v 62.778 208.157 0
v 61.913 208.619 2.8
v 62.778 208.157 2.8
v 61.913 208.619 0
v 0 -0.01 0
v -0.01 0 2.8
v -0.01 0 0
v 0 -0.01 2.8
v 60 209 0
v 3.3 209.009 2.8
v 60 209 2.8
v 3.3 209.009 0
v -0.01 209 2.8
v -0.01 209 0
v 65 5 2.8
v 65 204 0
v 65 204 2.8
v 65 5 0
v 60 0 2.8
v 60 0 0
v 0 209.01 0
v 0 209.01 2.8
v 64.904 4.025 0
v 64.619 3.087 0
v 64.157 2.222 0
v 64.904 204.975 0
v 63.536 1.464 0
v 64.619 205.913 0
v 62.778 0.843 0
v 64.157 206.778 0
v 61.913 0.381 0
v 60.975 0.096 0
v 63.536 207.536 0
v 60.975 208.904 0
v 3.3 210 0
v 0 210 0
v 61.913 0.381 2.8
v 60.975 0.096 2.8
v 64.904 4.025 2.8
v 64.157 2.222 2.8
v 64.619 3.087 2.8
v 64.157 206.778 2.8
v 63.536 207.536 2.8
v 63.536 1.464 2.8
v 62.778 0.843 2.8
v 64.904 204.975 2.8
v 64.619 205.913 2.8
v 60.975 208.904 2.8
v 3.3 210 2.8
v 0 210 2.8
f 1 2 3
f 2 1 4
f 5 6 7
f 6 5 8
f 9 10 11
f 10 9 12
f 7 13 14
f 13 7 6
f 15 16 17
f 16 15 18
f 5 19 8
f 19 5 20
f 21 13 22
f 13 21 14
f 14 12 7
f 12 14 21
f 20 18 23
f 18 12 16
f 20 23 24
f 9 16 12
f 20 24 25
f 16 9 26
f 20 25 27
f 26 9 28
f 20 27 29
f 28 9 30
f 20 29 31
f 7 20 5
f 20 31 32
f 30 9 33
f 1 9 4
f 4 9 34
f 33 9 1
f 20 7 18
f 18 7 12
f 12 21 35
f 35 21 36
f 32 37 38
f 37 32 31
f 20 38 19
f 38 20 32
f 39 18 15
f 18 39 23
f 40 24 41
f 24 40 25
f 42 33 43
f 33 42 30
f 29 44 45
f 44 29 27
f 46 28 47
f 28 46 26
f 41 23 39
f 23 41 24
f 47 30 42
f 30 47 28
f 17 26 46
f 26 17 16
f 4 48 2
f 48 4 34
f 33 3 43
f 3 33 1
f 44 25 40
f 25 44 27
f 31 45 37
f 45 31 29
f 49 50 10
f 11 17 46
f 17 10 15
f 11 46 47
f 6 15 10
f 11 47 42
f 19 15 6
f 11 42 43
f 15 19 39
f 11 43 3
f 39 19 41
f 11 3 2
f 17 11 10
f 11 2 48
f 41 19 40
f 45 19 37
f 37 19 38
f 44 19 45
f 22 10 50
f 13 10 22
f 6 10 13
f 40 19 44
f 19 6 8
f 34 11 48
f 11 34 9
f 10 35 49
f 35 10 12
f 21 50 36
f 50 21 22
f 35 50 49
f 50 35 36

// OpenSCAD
// 滑槽拼接 - 方向1：上下方向
// B部分：65mm × 209mm × 2.8mm
// 滑舌从上往下

// 参数
width = 65;      // 宽度 (mm)
height = 209;    // 高度 (mm)
thickness = 2.8; // 厚度 (mm)
corner_radius = 5;  // 倒角半径 (mm)

// 滑槽参数（与A部分匹配）
slot_depth = 3.3;     // 滑舌长度 (mm，比槽长0.3mm)
slot_height = 2.8;    // 滑舌高度 (mm，等于厚度）
slot_length = 200;    // 滑舌长度 (mm)
slot_offset = 10;      // 滑舌距离边缘 (mm)
tolerance = 0.3;       // 配合公差

// 圆角矩形模块（左侧不倒角）
module rounded_rect_left_flat(w, h, r, t) {
    hull() {
        translate([0, 0, 0]) cylinder(h = t, r = 0.01, $fn = 4);
        translate([0, h, 0]) cylinder(h = t, r = 0.01, $fn = 4);
        translate([w - r, h - r, 0]) cylinder(h = t, r = r, $fn = 32);
        translate([w - r, r, 0]) cylinder(h = t, r = r, $fn = 32);
    }
}

// 创建主体
difference() {
    union() {
        // 面板主体
        color("LightGray") {
            rounded_rect_left_flat(width, height, corner_radius, thickness);
        }

        // 滑舌（在左侧，上下方向）
        color("Blue") {
            translate([0, slot_offset, 0])
            cube([slot_depth, slot_length, slot_height]);
        }
    }
}

// 装配预览（打印时可注释掉）
/*
color("LightGray", 0.3)
translate([-slot_depth, 0, 0])
import("part_A_slot_updown.stl");
*/
